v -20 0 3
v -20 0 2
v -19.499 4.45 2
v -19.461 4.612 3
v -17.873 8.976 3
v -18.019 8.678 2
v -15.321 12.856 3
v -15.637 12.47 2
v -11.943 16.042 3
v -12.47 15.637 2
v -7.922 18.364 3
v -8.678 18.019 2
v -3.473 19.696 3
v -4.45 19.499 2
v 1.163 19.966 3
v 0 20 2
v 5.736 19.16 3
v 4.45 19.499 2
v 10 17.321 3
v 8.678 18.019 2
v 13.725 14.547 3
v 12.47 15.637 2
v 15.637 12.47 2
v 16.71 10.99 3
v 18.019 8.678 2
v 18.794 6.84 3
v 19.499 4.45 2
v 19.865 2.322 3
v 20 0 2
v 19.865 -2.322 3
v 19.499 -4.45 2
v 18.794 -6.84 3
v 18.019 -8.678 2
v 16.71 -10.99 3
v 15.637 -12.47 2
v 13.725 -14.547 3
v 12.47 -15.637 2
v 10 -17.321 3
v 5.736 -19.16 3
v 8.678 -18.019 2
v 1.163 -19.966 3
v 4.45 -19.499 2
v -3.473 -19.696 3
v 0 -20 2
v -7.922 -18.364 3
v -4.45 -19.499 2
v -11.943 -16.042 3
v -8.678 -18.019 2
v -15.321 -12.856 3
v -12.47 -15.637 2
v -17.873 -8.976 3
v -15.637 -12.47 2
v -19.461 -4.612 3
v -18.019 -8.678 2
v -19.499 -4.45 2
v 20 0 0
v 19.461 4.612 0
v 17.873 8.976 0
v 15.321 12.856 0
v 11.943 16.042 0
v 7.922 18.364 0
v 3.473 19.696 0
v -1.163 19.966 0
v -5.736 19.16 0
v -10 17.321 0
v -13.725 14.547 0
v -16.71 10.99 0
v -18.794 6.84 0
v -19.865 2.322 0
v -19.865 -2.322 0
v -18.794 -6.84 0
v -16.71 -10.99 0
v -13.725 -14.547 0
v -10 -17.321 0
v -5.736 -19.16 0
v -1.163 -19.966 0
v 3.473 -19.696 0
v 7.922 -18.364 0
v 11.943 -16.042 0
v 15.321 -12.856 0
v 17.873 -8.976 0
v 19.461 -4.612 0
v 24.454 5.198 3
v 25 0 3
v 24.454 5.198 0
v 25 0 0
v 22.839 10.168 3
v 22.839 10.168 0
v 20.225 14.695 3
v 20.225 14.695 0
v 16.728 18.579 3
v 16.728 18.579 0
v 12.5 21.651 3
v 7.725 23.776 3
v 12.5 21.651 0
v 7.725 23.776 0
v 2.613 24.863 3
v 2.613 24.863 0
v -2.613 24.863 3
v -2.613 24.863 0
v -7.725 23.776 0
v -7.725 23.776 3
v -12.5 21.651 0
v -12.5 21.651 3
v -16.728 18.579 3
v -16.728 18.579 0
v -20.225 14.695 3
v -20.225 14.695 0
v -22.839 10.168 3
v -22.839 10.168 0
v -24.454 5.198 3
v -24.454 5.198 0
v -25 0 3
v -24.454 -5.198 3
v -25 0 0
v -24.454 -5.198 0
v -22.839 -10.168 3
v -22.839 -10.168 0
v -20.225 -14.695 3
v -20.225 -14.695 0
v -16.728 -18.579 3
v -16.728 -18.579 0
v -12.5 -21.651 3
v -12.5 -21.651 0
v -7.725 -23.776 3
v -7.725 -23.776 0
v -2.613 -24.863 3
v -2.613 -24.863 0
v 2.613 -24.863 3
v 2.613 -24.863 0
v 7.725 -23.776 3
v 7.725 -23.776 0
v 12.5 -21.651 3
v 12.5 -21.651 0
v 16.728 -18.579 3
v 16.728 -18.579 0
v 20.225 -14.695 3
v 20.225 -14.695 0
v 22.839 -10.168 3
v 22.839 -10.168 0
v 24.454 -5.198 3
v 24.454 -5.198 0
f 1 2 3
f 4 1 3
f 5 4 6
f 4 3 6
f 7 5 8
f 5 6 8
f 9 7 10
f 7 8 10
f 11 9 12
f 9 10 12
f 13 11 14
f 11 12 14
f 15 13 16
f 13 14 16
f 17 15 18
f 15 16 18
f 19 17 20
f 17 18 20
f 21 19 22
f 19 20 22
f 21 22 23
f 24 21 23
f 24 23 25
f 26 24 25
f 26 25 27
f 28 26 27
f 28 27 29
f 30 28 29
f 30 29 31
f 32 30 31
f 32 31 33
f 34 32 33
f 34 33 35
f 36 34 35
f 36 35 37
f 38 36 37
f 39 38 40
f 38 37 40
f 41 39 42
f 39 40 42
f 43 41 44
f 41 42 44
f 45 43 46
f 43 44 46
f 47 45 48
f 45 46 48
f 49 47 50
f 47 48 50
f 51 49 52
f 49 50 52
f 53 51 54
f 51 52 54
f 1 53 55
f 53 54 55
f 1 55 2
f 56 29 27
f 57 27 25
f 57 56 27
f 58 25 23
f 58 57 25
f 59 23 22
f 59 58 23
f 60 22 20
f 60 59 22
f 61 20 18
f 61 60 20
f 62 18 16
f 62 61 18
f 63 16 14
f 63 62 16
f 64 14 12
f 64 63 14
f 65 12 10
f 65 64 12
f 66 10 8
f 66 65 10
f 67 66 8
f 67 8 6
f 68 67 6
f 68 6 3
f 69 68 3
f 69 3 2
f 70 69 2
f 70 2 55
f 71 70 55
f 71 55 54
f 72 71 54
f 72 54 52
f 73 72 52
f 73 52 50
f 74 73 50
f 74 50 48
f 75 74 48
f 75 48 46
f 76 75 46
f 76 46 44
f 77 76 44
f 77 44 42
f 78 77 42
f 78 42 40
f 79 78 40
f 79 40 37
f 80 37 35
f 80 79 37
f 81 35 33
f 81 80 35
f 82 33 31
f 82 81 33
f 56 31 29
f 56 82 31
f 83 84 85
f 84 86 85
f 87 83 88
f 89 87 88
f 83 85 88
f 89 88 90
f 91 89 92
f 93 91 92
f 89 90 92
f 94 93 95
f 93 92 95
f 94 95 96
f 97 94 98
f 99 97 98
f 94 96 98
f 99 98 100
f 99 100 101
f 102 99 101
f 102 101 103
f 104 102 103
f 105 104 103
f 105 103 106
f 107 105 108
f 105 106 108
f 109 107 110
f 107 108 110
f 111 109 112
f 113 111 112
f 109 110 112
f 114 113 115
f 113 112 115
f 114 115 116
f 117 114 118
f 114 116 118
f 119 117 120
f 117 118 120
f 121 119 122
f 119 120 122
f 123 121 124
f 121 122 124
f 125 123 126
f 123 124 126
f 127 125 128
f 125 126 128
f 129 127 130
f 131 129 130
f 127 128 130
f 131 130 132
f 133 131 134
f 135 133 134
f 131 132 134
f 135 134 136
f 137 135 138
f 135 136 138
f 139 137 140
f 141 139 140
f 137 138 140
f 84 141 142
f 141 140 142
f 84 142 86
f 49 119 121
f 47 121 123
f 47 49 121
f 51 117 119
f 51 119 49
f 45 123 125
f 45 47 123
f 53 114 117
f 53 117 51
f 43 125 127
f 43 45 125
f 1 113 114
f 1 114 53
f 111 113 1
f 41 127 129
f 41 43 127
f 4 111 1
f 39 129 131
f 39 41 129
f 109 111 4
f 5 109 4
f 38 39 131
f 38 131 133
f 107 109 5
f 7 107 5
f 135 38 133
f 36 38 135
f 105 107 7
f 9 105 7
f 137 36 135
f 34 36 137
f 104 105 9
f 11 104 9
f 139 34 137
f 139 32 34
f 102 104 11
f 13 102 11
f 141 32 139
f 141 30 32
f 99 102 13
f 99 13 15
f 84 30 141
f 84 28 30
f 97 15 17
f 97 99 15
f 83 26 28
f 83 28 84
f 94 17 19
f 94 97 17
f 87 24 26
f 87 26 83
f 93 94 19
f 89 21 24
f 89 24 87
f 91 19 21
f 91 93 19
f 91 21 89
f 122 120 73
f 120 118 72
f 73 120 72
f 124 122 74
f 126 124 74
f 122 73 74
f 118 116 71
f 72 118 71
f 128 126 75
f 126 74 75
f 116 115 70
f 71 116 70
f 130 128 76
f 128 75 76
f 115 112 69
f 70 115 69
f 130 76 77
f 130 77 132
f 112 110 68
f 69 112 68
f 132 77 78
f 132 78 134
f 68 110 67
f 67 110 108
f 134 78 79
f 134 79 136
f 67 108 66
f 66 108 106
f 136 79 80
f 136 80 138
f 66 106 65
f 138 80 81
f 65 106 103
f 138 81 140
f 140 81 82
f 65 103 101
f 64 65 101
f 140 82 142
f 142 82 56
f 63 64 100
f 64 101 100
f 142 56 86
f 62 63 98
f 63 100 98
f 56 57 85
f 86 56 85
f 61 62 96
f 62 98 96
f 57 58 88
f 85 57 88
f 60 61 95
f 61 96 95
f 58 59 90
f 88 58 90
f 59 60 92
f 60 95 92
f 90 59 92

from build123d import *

# Parameters (mm, degrees)
SKETCH1_R           = 25
SKETCH1_R_2         = 20
BOSS_EXTRUDE1_DEPTH = 2
SKETCH2_R           = 25
BOSS_EXTRUDE2_DEPTH = 1
SKETCH3_R           = 20
CUT_EXTRUDE1_DEPTH  = 1


with BuildPart() as part:
    # Sketch1 → Boss-Extrude1 (new body)
    with BuildSketch(Plane.XY):
        Circle(SKETCH1_R)
        Circle(SKETCH1_R_2, mode=Mode.SUBTRACT)
    extrude(amount=BOSS_EXTRUDE1_DEPTH)

    # Sketch2 → Boss-Extrude2 (add)
    with BuildSketch(Plane.XY.offset(2)):
        Circle(SKETCH2_R)
    extrude(amount=BOSS_EXTRUDE2_DEPTH)

    # Sketch3 → Cut-Extrude1 (cut)
    with BuildSketch(Plane(origin=(0, 0, 2), x_dir=(-1, 0, 0), z_dir=(0, 0, -1))):
        Circle(SKETCH3_R)
    extrude(amount=-CUT_EXTRUDE1_DEPTH, mode=Mode.SUBTRACT)


solid = part.part
